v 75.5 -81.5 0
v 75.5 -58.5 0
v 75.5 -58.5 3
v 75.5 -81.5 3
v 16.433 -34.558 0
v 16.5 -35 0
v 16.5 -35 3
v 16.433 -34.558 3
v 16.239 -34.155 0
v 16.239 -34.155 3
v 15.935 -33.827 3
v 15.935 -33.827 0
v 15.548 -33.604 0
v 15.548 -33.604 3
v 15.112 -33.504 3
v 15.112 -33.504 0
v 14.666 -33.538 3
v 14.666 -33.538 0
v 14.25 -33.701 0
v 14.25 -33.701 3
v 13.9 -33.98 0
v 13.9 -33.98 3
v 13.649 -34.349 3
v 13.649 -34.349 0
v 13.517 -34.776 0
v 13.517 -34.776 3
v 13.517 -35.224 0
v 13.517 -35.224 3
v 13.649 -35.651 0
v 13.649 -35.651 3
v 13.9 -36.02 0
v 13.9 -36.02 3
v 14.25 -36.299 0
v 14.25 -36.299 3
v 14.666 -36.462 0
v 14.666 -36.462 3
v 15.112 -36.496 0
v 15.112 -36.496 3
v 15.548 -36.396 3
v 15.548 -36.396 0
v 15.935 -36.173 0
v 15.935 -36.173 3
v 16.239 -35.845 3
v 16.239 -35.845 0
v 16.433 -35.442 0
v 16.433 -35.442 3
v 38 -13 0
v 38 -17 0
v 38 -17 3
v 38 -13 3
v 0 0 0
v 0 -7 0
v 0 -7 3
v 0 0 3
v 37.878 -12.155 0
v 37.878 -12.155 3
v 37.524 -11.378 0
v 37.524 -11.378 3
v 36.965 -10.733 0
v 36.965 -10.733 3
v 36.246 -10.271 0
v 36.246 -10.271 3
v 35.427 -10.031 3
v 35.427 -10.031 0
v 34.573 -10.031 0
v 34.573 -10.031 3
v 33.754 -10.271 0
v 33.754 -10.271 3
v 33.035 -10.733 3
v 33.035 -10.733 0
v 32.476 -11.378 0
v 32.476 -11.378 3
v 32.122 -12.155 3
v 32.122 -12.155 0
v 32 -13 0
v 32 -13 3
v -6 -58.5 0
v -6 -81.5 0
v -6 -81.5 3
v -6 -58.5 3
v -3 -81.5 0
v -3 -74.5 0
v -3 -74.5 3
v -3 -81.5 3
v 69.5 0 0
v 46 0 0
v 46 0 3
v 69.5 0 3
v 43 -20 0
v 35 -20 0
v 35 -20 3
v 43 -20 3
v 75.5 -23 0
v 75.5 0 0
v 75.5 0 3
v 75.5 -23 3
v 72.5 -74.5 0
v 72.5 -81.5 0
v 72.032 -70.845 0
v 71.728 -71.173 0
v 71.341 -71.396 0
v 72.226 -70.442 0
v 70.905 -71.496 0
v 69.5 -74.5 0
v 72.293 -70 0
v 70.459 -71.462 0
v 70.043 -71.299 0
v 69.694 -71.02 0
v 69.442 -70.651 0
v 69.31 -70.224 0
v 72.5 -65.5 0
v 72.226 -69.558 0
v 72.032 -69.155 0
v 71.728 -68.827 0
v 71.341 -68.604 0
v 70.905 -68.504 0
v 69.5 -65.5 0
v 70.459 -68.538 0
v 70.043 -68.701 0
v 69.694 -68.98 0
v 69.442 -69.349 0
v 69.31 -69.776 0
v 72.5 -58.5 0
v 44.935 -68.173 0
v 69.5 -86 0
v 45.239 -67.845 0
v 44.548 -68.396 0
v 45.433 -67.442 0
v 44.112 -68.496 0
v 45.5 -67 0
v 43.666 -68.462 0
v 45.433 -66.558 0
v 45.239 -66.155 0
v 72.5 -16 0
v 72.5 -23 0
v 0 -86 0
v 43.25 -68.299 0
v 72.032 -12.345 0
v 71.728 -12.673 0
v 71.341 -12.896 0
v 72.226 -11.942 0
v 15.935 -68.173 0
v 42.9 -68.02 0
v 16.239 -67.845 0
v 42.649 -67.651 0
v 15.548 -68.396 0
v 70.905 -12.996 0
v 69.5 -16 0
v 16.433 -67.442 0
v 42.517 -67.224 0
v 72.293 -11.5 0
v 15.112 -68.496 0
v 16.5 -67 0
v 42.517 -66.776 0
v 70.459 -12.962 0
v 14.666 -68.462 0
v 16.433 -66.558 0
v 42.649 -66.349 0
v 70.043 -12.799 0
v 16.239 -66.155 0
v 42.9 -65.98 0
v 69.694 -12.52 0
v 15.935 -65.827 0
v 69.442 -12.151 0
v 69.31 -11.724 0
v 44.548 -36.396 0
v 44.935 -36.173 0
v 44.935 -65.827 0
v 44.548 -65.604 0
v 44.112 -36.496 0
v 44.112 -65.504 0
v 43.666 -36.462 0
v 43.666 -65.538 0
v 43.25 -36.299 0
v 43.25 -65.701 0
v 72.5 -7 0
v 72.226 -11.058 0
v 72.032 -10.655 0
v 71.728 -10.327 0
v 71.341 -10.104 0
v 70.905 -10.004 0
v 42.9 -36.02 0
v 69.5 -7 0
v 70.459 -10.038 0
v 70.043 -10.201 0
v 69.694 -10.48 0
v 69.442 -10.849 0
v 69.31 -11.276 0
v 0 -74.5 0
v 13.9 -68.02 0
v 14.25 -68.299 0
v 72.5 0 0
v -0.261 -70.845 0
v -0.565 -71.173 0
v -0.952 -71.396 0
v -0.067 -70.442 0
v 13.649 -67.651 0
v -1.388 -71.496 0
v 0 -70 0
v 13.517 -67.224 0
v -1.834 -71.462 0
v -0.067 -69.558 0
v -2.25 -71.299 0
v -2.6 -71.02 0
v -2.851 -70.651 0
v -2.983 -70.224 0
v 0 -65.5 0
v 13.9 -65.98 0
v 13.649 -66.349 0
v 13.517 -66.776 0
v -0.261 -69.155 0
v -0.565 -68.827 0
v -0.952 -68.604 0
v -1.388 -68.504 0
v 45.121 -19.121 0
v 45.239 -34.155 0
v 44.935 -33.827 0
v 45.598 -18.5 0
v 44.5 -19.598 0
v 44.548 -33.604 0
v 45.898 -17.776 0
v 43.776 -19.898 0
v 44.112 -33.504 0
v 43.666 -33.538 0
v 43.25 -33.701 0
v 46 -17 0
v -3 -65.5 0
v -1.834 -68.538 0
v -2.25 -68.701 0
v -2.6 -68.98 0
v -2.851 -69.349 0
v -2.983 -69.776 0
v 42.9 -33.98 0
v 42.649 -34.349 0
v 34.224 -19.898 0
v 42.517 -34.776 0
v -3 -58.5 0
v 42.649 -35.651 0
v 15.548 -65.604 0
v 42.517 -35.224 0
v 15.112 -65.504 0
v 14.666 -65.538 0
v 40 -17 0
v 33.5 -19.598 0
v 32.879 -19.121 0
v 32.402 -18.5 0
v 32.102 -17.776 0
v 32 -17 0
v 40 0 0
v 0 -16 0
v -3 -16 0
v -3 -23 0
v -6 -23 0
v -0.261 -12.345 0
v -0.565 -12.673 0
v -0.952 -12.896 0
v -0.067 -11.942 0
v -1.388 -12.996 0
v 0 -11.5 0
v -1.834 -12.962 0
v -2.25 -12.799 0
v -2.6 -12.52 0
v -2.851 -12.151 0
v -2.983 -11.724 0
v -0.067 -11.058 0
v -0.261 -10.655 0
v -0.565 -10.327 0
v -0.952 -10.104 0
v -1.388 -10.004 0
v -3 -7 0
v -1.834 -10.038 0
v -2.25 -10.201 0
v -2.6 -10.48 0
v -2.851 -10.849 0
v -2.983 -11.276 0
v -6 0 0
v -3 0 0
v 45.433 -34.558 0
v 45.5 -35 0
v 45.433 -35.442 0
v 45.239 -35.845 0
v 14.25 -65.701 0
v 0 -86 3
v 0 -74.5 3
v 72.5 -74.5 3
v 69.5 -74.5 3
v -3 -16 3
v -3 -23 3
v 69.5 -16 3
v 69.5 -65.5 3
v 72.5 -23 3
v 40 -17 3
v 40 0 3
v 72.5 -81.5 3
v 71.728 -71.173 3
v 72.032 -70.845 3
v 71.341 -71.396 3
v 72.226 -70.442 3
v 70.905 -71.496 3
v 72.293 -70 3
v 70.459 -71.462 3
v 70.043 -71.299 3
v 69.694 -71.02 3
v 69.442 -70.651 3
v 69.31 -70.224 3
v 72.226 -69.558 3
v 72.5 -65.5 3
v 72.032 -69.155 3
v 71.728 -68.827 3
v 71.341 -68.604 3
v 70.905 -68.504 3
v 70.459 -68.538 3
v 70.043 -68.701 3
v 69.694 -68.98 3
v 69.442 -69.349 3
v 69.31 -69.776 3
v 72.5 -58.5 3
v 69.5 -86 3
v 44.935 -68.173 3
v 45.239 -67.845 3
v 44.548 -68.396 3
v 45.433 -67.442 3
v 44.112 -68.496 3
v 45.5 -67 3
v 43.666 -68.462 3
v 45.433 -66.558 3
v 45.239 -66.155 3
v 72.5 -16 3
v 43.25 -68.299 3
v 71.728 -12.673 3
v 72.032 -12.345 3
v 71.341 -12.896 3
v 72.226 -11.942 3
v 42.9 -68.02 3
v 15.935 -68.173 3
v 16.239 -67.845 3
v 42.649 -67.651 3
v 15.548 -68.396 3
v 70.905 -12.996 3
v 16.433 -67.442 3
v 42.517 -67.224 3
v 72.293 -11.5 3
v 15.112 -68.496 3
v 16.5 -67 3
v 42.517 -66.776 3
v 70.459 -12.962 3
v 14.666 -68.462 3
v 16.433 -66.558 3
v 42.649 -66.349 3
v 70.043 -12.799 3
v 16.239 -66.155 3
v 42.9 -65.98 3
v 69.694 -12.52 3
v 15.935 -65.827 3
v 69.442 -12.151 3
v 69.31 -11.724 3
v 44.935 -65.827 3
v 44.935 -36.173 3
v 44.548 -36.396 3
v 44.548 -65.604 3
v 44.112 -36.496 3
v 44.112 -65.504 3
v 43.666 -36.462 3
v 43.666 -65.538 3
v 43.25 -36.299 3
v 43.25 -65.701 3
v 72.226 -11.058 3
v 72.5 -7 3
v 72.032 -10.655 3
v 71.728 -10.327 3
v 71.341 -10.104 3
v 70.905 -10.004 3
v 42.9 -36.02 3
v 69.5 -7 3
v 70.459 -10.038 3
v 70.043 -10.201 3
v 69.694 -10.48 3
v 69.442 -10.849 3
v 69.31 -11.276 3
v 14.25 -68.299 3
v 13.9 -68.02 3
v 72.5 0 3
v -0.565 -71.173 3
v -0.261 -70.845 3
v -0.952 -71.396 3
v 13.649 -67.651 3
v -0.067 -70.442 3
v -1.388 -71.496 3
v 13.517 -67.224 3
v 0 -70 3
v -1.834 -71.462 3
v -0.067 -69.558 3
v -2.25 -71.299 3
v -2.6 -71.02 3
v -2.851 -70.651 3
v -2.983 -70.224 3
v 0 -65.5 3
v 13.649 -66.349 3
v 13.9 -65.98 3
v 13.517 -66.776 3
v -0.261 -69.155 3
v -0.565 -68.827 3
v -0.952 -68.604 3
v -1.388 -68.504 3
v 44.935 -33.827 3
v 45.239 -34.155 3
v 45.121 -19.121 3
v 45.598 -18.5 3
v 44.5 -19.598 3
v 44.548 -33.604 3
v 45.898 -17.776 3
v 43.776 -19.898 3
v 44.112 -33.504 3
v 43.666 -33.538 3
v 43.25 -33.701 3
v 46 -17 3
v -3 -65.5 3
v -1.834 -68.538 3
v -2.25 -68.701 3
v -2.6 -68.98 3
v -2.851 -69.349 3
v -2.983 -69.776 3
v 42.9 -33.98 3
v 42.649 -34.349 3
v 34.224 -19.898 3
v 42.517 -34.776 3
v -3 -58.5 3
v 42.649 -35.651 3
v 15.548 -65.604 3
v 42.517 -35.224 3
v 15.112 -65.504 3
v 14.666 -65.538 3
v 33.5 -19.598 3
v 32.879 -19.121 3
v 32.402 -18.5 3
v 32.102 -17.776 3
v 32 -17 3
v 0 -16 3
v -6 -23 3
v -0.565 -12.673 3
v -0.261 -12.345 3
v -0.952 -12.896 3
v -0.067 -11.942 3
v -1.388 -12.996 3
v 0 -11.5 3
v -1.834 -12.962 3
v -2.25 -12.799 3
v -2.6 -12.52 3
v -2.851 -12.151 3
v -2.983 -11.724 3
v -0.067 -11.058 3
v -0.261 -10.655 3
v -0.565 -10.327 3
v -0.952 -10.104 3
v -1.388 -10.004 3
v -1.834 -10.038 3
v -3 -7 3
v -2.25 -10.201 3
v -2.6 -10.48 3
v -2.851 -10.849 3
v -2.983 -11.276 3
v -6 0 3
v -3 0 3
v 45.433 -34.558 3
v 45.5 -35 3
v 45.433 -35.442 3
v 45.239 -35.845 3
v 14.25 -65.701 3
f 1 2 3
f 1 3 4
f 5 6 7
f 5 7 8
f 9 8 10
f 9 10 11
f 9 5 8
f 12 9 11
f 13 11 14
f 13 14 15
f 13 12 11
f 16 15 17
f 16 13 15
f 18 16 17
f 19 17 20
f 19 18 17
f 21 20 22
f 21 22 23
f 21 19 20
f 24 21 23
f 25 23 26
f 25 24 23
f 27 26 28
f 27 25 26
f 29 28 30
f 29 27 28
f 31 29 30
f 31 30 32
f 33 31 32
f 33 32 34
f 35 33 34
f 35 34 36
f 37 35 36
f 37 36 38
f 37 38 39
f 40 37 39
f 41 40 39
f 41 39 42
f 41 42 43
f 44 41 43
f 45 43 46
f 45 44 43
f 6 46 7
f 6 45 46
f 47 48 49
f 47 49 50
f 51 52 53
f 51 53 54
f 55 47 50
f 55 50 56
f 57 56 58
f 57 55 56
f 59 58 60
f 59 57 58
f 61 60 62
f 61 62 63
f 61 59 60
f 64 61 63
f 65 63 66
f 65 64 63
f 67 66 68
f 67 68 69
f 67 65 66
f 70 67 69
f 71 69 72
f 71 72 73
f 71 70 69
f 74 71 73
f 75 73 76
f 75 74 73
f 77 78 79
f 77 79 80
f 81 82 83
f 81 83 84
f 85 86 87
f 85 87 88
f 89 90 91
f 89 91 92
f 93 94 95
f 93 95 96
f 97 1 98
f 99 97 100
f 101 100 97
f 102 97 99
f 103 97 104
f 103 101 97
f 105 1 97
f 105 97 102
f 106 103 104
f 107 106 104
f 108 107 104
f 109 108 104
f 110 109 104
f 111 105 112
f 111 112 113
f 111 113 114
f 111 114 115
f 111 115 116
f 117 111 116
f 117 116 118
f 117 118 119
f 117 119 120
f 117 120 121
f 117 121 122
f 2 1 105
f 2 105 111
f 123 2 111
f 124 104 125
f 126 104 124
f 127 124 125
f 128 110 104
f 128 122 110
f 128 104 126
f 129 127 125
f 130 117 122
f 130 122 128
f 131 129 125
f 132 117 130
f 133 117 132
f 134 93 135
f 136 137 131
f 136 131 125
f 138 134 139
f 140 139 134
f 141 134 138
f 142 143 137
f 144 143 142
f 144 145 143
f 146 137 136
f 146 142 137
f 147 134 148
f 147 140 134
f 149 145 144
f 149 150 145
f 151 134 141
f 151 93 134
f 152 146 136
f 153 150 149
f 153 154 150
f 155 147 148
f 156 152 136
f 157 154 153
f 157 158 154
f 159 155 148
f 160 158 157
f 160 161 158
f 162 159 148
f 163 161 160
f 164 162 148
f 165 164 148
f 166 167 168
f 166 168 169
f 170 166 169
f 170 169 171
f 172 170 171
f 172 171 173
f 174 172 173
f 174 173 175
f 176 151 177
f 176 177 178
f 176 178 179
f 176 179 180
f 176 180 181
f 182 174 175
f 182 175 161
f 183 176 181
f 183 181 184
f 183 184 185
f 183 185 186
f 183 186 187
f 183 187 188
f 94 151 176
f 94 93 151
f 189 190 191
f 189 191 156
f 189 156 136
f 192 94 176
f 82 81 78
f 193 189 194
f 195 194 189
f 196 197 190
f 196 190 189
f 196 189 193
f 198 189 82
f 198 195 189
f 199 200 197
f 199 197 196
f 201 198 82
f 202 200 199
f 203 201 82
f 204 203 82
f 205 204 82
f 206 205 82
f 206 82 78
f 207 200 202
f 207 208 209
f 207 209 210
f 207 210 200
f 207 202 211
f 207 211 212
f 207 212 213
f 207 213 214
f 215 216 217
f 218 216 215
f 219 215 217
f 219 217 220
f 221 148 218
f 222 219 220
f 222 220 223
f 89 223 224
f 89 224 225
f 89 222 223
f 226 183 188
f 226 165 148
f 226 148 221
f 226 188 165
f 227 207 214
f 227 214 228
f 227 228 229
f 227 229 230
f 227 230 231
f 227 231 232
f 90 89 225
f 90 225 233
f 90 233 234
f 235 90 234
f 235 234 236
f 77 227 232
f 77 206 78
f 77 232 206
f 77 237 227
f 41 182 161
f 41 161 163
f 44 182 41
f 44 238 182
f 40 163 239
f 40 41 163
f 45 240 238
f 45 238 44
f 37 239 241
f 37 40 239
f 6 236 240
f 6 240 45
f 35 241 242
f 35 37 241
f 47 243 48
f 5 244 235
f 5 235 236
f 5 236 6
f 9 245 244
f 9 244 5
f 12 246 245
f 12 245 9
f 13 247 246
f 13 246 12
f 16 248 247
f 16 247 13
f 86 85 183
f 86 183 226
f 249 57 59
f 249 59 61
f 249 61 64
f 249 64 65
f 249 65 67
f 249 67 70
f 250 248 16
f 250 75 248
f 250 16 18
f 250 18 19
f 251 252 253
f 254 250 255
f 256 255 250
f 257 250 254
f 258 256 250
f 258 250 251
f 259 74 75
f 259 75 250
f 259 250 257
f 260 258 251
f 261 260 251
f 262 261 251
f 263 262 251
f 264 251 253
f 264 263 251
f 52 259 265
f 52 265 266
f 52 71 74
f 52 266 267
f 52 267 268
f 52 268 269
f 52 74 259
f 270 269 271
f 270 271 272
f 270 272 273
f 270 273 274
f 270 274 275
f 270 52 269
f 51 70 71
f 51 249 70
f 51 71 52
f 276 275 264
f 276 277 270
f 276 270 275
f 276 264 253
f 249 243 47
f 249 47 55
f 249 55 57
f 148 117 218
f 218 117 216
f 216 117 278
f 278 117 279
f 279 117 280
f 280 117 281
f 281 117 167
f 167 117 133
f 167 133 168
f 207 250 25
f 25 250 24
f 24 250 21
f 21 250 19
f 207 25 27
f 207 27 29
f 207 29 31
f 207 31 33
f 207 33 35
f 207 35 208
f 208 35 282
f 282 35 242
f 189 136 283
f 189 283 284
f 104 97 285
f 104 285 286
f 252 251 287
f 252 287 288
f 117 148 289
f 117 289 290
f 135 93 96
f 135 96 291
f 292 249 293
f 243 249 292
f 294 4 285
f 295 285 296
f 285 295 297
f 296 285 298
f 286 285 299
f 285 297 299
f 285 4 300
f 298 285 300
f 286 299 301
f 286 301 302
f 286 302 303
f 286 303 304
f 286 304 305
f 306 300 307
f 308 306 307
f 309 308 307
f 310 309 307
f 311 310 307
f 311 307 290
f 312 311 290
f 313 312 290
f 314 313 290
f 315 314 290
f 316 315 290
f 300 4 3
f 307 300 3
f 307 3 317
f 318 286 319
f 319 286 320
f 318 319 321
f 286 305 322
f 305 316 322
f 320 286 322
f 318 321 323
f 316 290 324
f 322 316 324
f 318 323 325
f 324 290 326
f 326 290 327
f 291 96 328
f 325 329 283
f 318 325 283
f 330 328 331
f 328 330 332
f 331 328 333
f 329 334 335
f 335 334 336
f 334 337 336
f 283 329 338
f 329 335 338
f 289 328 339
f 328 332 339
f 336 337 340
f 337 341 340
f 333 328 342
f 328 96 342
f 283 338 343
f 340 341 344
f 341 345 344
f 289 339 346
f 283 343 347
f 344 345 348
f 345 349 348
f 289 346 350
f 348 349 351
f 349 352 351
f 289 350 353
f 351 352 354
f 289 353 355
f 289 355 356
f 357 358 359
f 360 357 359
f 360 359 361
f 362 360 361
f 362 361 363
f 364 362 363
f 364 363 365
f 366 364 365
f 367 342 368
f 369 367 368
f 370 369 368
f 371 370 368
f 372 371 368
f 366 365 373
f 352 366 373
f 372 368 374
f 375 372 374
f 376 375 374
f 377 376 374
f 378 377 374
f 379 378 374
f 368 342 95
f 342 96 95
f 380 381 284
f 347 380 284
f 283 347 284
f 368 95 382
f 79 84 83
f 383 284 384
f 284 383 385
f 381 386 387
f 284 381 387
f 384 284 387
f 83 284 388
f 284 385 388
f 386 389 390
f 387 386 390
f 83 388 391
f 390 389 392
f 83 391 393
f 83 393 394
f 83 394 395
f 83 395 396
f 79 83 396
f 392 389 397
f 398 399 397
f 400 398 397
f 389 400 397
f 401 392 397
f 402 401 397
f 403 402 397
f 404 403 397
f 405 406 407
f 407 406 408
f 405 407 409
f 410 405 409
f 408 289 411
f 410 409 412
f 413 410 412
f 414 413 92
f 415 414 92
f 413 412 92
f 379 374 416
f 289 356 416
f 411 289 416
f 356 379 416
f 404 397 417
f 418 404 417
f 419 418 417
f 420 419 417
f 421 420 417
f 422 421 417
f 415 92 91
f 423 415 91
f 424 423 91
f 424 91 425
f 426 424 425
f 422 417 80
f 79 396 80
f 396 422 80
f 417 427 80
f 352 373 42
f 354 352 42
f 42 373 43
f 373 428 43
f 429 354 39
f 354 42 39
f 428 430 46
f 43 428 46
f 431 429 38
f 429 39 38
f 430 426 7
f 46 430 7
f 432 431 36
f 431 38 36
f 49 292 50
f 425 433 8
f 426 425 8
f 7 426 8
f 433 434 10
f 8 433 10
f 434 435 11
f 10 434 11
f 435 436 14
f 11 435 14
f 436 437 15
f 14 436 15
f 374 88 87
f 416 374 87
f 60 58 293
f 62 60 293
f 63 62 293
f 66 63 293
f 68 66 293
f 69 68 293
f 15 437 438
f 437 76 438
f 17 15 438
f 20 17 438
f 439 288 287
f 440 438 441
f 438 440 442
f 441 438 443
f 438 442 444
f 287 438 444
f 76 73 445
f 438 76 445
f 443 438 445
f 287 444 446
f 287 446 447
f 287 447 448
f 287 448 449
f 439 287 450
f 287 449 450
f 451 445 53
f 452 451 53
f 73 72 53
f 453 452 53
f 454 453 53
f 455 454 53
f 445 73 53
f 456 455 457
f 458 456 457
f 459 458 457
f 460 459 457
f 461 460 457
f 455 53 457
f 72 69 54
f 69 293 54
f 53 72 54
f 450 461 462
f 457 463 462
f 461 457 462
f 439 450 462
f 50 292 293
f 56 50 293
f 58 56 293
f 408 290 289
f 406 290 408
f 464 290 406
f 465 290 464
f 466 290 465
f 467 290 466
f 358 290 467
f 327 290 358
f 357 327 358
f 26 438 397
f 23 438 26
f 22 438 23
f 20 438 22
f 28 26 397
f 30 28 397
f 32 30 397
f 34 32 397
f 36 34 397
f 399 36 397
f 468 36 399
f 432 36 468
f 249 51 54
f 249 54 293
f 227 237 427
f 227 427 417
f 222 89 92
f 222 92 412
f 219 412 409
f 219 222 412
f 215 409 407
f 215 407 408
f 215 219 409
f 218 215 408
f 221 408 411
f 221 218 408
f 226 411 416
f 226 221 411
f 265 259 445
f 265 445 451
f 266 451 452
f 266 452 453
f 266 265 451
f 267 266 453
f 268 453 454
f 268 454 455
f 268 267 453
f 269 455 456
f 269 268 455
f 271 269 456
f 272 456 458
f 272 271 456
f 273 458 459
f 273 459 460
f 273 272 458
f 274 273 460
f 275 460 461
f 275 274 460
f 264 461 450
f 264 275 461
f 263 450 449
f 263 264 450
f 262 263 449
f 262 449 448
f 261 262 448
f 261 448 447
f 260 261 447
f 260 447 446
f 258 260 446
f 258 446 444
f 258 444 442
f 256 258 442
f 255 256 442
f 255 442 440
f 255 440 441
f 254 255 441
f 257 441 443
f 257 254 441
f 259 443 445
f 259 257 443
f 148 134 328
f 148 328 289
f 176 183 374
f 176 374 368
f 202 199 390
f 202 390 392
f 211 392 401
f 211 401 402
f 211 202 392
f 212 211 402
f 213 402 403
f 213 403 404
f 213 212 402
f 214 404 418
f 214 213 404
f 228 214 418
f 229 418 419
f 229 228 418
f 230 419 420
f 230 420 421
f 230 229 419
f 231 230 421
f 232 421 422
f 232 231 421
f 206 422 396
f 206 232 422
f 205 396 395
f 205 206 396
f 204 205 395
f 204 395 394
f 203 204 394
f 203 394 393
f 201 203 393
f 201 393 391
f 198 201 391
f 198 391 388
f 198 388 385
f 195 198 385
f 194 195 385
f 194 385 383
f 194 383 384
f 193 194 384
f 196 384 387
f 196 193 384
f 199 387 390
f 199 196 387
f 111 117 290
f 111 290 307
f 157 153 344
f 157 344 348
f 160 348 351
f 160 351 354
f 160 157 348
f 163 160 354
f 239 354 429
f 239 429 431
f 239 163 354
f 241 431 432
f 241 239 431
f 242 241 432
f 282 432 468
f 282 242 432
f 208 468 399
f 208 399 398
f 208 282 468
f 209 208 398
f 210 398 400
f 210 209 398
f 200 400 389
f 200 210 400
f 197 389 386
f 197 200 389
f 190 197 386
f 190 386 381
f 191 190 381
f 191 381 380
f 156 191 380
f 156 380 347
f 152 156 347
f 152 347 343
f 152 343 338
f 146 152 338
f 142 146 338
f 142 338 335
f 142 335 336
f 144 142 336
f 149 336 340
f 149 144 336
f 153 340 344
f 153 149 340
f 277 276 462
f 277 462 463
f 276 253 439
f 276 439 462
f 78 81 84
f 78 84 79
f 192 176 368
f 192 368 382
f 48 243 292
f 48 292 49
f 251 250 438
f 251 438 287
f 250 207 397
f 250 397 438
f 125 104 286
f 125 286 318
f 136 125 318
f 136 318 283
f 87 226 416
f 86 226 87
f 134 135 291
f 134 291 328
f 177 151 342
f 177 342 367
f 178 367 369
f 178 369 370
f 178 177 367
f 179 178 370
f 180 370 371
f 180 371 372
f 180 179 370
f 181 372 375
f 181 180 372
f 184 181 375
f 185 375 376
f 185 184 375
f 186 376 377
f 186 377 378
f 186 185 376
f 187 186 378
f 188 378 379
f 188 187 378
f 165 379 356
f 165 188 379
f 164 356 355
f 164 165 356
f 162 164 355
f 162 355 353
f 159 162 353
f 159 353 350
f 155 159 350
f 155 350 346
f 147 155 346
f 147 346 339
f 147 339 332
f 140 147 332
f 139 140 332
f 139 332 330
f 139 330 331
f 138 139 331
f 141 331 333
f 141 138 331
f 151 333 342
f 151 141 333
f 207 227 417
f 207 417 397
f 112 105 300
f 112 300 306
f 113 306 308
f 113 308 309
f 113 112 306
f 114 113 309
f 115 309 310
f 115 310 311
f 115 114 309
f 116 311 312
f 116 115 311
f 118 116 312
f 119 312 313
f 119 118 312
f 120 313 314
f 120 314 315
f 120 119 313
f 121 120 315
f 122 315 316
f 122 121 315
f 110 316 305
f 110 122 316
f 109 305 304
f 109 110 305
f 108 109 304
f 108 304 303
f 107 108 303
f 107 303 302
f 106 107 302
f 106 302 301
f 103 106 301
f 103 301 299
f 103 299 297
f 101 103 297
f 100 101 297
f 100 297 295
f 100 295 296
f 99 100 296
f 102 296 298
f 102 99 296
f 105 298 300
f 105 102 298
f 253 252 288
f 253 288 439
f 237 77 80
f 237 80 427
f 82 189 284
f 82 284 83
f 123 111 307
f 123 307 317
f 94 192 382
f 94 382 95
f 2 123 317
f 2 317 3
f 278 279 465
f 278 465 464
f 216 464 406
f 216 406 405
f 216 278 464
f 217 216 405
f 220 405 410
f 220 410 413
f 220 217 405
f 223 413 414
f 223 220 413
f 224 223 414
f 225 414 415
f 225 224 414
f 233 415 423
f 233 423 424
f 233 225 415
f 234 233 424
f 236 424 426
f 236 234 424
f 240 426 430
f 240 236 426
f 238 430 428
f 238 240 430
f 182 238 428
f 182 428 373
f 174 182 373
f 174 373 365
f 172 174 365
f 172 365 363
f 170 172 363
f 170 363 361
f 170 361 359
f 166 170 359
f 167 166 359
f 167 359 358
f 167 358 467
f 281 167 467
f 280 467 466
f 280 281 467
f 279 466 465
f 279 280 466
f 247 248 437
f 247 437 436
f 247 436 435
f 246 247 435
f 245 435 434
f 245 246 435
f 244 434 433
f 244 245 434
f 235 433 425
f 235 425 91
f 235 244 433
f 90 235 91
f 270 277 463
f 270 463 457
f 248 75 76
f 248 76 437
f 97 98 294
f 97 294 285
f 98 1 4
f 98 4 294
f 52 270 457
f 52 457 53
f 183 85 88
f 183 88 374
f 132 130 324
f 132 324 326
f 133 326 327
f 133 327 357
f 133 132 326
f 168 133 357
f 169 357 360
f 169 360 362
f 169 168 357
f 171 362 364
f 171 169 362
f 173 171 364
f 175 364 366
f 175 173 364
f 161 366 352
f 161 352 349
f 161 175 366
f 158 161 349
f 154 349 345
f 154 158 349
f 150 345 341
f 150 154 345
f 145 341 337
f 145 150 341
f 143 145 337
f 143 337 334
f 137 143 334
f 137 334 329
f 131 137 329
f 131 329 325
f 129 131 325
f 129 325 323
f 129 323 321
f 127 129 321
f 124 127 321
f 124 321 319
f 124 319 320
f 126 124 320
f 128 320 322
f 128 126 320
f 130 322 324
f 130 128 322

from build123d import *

# Parameters (mm, degrees)
SKETCH_1_R      = 1.5
EXTRUDE_1_DEPTH = 3


with BuildPart() as part:
    # 草图1 → 凸台-拉伸1 (new body)
    with BuildSketch(Plane.XY):
        with BuildLine():
            Line((0, 0), (40, 0))
            Line((40, 0), (40, -17))
            Line((40, -17), (38, -17))
            Line((38, -17), (38, -13))
            ThreePointArc((38, -13), (35.000000014, -10.000000014), (32.000000029, -13))
            Line((32.000000029, -13), (32.000000029, -17))
            ThreePointArc((32.000000029, -17), (32.878679681, -19.121320333), (35.000000014, -20))
            Line((35.000000014, -20), (43.000000014, -20))
            ThreePointArc((43.000000014, -20), (45.121320358, -19.121320344), (46.000000014, -17))
            Line((46.000000014, -17), (46.000000014, 0))
            Line((46.000000014, 0), (69.5, 0))
            Line((69.5, 0), (69.5, -7))
            Line((69.5, -7), (72.5, -7))
            Line((72.5, -7), (72.5, 0))
            Line((72.5, 0), (75.5, 0))
            Line((75.5, 0), (75.5, -23))
            Line((75.5, -23), (72.5, -23))
            Line((72.5, -23), (72.5, -16))
            Line((72.5, -16), (69.5, -16))
            Line((69.5, -16), (69.5, -65.5))
            Line((69.5, -65.5), (72.5, -65.5))
            Line((72.5, -65.5), (72.5, -58.5))
            Line((72.5, -58.5), (75.5, -58.5))
            Line((75.5, -58.5), (75.5, -81.5))
            Line((75.5, -81.5), (72.5, -81.5))
            Line((72.5, -81.5), (72.5, -74.5))
            Line((72.5, -74.5), (69.5, -74.5))
            Line((69.5, -74.5), (69.5, -86))
            Line((69.5, -86), (0, -86))
            Line((0, -86), (0, -74.5))
            Line((0, -74.5), (-3, -74.5))
            Line((-3, -74.5), (-3, -81.5))
            Line((-3, -81.5), (-6, -81.5))
            Line((-6, -81.5), (-6, -58.5))
            Line((-6, -58.5), (-3, -58.5))
            Line((-3, -58.5), (-3, -65.5))
            Line((-3, -65.5), (0, -65.5))
            Line((0, -65.5), (0, -16))
            Line((0, -16), (-3, -16))
            Line((-3, -16), (-3, -23))
            Line((-3, -23), (-6, -23))
            Line((-6, -23), (-6, 0))
            Line((-6, 0), (-3, 0))
            Line((-3, 0), (-3, -7))
            Line((-3, -7), (0, -7))
            Line((0, -7), (0, 0))
        make_face()
        with Locations((15, -67)):
            Circle(SKETCH_1_R, mode=Mode.SUBTRACT)
        with Locations((44, -67)):
            Circle(SKETCH_1_R, mode=Mode.SUBTRACT)
        with Locations((15, -35)):
            Circle(SKETCH_1_R, mode=Mode.SUBTRACT)
        with Locations((44, -35)):
            Circle(SKETCH_1_R, mode=Mode.SUBTRACT)
        with Locations((-1.5, -70)):
            Circle(SKETCH_1_R, mode=Mode.SUBTRACT)
        with Locations((70.793087485, -70)):
            Circle(SKETCH_1_R, mode=Mode.SUBTRACT)
        with Locations((-1.5, -11.5)):
            Circle(SKETCH_1_R, mode=Mode.SUBTRACT)
        with Locations((70.793087485, -11.5)):
            Circle(SKETCH_1_R, mode=Mode.SUBTRACT)
    extrude(amount=EXTRUDE_1_DEPTH)


solid = part.part
